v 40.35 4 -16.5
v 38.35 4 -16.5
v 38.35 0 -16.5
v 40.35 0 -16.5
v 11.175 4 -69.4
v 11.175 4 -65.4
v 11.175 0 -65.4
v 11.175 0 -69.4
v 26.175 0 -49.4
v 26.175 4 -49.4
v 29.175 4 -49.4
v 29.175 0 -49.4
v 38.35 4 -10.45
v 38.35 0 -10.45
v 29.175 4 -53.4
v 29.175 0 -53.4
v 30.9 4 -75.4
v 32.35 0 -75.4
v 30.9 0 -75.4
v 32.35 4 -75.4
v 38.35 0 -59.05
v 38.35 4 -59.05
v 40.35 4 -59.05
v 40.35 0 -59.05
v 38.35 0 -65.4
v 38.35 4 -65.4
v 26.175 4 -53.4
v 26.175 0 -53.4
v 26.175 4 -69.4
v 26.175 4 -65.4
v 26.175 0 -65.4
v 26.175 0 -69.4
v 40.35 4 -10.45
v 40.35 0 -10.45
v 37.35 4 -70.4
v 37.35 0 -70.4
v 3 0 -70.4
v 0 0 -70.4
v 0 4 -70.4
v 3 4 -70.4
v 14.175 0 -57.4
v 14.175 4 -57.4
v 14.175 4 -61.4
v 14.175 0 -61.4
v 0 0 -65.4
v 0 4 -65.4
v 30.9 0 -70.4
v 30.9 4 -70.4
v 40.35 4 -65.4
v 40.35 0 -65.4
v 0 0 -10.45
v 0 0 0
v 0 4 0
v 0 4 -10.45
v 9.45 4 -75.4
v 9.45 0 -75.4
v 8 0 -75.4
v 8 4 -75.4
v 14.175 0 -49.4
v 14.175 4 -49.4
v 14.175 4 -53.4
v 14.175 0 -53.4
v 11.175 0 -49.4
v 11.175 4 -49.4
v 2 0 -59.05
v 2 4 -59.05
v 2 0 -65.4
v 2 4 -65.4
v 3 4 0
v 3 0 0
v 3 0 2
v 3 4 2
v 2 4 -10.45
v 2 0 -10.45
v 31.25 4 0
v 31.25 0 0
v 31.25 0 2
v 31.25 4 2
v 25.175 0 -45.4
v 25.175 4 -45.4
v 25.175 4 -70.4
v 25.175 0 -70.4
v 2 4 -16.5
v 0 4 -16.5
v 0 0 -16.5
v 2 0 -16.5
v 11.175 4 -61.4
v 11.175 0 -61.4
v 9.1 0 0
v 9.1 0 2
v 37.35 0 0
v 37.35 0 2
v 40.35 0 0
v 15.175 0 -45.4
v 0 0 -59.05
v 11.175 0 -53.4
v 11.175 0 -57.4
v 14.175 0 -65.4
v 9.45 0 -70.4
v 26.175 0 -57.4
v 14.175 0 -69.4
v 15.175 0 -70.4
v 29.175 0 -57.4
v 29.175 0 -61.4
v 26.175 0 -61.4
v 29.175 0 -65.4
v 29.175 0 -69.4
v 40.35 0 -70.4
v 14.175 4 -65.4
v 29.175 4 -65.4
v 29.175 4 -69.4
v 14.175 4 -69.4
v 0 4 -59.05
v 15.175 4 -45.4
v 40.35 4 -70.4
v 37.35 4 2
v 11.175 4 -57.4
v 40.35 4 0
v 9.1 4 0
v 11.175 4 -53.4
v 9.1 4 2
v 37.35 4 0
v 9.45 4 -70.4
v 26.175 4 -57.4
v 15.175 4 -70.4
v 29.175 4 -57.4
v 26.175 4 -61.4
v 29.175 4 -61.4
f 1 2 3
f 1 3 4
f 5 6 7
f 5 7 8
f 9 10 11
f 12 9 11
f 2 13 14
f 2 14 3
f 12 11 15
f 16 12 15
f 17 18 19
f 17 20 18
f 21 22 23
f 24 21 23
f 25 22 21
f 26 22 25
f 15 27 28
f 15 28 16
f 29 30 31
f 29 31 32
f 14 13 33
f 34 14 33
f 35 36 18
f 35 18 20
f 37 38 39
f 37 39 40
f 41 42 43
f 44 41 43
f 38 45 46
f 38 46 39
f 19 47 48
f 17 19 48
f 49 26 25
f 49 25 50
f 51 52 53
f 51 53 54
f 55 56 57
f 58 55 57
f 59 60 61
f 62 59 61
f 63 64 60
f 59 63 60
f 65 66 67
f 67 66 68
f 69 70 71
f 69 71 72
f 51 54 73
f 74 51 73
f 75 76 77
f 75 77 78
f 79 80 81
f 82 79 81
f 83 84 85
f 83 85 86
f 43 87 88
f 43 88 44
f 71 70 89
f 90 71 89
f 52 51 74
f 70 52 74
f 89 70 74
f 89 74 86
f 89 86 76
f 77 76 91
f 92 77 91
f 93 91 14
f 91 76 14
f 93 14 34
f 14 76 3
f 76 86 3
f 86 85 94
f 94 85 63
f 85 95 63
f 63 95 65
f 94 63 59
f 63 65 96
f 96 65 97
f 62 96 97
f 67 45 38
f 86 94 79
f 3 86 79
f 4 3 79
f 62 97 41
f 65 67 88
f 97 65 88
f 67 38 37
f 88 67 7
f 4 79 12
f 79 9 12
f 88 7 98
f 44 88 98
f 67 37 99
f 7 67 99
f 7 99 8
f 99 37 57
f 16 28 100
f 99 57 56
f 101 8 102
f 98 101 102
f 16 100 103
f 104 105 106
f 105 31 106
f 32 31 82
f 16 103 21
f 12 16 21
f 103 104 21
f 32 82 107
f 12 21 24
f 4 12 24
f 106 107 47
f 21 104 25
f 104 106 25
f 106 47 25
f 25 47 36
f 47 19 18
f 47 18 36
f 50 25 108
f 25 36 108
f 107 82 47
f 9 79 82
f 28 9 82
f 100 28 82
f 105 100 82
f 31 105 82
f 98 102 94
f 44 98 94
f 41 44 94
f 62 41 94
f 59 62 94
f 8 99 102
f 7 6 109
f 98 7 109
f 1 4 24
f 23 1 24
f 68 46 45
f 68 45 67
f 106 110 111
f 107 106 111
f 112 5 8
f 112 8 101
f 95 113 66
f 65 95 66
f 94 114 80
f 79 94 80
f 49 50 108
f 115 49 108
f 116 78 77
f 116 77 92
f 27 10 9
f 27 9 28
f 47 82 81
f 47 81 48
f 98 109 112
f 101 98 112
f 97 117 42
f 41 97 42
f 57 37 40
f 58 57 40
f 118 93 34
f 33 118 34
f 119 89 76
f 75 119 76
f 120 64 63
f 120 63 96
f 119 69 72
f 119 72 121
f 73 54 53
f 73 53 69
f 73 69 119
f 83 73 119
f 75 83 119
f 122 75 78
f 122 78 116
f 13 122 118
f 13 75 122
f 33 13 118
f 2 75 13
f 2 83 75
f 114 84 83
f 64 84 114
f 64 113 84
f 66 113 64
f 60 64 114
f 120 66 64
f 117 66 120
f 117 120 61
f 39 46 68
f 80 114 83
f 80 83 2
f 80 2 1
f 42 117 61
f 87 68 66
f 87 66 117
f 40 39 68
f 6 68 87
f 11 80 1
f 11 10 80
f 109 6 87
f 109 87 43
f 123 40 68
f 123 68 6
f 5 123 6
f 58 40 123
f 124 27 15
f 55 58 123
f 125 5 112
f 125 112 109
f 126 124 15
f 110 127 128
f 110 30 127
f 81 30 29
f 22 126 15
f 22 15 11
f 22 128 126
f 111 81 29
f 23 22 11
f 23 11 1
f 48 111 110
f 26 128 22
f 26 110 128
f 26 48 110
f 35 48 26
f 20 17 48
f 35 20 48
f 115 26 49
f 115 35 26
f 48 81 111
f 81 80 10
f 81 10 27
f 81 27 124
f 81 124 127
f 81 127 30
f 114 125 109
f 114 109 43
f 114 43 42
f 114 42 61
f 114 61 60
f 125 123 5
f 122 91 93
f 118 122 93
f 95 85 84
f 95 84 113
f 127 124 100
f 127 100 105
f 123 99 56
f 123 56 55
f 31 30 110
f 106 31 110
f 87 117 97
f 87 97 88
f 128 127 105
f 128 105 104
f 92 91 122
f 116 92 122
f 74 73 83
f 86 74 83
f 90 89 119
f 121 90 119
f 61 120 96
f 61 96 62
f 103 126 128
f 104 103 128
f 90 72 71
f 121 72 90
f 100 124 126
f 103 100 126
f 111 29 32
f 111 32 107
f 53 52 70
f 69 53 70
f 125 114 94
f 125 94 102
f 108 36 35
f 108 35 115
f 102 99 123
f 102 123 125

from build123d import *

# Parameters (mm, degrees)
SKETCH_1_W          = 40.35
SKETCH_1_H          = 70.4
EXTRUDE_1_DEPTH     = 4
SKETCH_2_W          = 2
SKETCH_2_H          = 6.05
SKETCH_2_H_2        = 6.35
SKETCH_2_W_2        = 10
SKETCH_2_H_3        = 25
CUT_EXTRUDE_3_DEPTH = 82.242122695
SKETCH_4_W          = 3
SKETCH_4_H          = 4
CUT_EXTRUDE_4_DEPTH = 82.242122695
SKETCH_5_W          = 6.45
SKETCH_5_H          = 4
EXTRUDE_2_DEPTH     = 5
CHAMFER_1_SIZE      = 5
SKETCH_6_W          = 6.1
SKETCH_6_H          = 4
EXTRUDE_3_DEPTH     = 2


with BuildPart() as part:
    # ｽｹｯﾁ1 → ﾎﾞｽ - 押し出し1 (new body)
    with BuildSketch(Plane(origin=(0, 0, 0), x_dir=(1, 0, 0), z_dir=(0, 1, 0))):
        with Locations((20.175, 35.2)):
            Rectangle(SKETCH_1_W, SKETCH_1_H)
    extrude(amount=EXTRUDE_1_DEPTH)

    # ｽｹｯﾁ2 → ｶｯﾄ - 押し出し3 (cut, through all)
    with BuildSketch(Plane(origin=(0, 4, 0), x_dir=(1, 0, 0), z_dir=(0, 1, 0))):
        with Locations((1, 13.475)):
            Rectangle(SKETCH_2_W, SKETCH_2_H)
        with Locations((39.35, 13.475)):
            Rectangle(SKETCH_2_W, SKETCH_2_H)
        with Locations((1, 62.225)):
            Rectangle(SKETCH_2_W, SKETCH_2_H_2)
        with Locations((39.35, 62.225)):
            Rectangle(SKETCH_2_W, SKETCH_2_H_2)
        with Locations((20.175, 57.9)):
            Rectangle(SKETCH_2_W_2, SKETCH_2_H_3)
    extrude(amount=-CUT_EXTRUDE_3_DEPTH, mode=Mode.SUBTRACT)

    # ｽｹｯﾁ4 → ｶｯﾄ - 押し出し4 (cut, through all)
    with BuildSketch(Plane(origin=(0, 4, 0), x_dir=(1, 0, 0), z_dir=(0, 1, 0))):
        with Locations((12.675, 67.4)):
            Rectangle(SKETCH_4_W, SKETCH_4_H)
        with Locations((12.675, 59.4)):
            Rectangle(SKETCH_4_W, SKETCH_4_H)
        with Locations((12.675, 51.4)):
            Rectangle(SKETCH_4_W, SKETCH_4_H)
        with Locations((27.675, 67.4)):
            Rectangle(SKETCH_4_W, SKETCH_4_H)
        with Locations((27.675, 59.4)):
            Rectangle(SKETCH_4_W, SKETCH_4_H)
        with Locations((27.675, 51.4)):
            Rectangle(SKETCH_4_W, SKETCH_4_H)
    extrude(amount=-CUT_EXTRUDE_4_DEPTH, mode=Mode.SUBTRACT)

    # ｽｹｯﾁ5 → ﾎﾞｽ - 押し出し2 (add)
    with BuildSketch(Plane(origin=(0, 0, -70.4), x_dir=(-1, 0, 0), z_dir=(0, 0, -1))):
        with Locations((-34.125, 2)):
            Rectangle(SKETCH_5_W, SKETCH_5_H)
        with Locations((-6.225, 2)):
            Rectangle(SKETCH_5_W, SKETCH_5_H)
    extrude(amount=EXTRUDE_2_DEPTH)

    # 面取り1
    chamfer_1_edges = [part.edges().sort_by_distance(p)[0] for p in [
        (3, 2, -75.4),
        (37.35, 2, -75.4),
    ]]
    chamfer(chamfer_1_edges, length=CHAMFER_1_SIZE - 0.0001)  # a hair under: the kernel refuses the full size

    # ｽｹｯﾁ6 → ﾎﾞｽ - 押し出し3 (add)
    with BuildSketch(Plane.XY):
        with Locations((6.05, 2)):
            Rectangle(SKETCH_6_W, SKETCH_6_H)
        with Locations((34.3, 2)):
            Rectangle(SKETCH_6_W, SKETCH_6_H)
    extrude(amount=EXTRUDE_3_DEPTH)


solid = part.part
